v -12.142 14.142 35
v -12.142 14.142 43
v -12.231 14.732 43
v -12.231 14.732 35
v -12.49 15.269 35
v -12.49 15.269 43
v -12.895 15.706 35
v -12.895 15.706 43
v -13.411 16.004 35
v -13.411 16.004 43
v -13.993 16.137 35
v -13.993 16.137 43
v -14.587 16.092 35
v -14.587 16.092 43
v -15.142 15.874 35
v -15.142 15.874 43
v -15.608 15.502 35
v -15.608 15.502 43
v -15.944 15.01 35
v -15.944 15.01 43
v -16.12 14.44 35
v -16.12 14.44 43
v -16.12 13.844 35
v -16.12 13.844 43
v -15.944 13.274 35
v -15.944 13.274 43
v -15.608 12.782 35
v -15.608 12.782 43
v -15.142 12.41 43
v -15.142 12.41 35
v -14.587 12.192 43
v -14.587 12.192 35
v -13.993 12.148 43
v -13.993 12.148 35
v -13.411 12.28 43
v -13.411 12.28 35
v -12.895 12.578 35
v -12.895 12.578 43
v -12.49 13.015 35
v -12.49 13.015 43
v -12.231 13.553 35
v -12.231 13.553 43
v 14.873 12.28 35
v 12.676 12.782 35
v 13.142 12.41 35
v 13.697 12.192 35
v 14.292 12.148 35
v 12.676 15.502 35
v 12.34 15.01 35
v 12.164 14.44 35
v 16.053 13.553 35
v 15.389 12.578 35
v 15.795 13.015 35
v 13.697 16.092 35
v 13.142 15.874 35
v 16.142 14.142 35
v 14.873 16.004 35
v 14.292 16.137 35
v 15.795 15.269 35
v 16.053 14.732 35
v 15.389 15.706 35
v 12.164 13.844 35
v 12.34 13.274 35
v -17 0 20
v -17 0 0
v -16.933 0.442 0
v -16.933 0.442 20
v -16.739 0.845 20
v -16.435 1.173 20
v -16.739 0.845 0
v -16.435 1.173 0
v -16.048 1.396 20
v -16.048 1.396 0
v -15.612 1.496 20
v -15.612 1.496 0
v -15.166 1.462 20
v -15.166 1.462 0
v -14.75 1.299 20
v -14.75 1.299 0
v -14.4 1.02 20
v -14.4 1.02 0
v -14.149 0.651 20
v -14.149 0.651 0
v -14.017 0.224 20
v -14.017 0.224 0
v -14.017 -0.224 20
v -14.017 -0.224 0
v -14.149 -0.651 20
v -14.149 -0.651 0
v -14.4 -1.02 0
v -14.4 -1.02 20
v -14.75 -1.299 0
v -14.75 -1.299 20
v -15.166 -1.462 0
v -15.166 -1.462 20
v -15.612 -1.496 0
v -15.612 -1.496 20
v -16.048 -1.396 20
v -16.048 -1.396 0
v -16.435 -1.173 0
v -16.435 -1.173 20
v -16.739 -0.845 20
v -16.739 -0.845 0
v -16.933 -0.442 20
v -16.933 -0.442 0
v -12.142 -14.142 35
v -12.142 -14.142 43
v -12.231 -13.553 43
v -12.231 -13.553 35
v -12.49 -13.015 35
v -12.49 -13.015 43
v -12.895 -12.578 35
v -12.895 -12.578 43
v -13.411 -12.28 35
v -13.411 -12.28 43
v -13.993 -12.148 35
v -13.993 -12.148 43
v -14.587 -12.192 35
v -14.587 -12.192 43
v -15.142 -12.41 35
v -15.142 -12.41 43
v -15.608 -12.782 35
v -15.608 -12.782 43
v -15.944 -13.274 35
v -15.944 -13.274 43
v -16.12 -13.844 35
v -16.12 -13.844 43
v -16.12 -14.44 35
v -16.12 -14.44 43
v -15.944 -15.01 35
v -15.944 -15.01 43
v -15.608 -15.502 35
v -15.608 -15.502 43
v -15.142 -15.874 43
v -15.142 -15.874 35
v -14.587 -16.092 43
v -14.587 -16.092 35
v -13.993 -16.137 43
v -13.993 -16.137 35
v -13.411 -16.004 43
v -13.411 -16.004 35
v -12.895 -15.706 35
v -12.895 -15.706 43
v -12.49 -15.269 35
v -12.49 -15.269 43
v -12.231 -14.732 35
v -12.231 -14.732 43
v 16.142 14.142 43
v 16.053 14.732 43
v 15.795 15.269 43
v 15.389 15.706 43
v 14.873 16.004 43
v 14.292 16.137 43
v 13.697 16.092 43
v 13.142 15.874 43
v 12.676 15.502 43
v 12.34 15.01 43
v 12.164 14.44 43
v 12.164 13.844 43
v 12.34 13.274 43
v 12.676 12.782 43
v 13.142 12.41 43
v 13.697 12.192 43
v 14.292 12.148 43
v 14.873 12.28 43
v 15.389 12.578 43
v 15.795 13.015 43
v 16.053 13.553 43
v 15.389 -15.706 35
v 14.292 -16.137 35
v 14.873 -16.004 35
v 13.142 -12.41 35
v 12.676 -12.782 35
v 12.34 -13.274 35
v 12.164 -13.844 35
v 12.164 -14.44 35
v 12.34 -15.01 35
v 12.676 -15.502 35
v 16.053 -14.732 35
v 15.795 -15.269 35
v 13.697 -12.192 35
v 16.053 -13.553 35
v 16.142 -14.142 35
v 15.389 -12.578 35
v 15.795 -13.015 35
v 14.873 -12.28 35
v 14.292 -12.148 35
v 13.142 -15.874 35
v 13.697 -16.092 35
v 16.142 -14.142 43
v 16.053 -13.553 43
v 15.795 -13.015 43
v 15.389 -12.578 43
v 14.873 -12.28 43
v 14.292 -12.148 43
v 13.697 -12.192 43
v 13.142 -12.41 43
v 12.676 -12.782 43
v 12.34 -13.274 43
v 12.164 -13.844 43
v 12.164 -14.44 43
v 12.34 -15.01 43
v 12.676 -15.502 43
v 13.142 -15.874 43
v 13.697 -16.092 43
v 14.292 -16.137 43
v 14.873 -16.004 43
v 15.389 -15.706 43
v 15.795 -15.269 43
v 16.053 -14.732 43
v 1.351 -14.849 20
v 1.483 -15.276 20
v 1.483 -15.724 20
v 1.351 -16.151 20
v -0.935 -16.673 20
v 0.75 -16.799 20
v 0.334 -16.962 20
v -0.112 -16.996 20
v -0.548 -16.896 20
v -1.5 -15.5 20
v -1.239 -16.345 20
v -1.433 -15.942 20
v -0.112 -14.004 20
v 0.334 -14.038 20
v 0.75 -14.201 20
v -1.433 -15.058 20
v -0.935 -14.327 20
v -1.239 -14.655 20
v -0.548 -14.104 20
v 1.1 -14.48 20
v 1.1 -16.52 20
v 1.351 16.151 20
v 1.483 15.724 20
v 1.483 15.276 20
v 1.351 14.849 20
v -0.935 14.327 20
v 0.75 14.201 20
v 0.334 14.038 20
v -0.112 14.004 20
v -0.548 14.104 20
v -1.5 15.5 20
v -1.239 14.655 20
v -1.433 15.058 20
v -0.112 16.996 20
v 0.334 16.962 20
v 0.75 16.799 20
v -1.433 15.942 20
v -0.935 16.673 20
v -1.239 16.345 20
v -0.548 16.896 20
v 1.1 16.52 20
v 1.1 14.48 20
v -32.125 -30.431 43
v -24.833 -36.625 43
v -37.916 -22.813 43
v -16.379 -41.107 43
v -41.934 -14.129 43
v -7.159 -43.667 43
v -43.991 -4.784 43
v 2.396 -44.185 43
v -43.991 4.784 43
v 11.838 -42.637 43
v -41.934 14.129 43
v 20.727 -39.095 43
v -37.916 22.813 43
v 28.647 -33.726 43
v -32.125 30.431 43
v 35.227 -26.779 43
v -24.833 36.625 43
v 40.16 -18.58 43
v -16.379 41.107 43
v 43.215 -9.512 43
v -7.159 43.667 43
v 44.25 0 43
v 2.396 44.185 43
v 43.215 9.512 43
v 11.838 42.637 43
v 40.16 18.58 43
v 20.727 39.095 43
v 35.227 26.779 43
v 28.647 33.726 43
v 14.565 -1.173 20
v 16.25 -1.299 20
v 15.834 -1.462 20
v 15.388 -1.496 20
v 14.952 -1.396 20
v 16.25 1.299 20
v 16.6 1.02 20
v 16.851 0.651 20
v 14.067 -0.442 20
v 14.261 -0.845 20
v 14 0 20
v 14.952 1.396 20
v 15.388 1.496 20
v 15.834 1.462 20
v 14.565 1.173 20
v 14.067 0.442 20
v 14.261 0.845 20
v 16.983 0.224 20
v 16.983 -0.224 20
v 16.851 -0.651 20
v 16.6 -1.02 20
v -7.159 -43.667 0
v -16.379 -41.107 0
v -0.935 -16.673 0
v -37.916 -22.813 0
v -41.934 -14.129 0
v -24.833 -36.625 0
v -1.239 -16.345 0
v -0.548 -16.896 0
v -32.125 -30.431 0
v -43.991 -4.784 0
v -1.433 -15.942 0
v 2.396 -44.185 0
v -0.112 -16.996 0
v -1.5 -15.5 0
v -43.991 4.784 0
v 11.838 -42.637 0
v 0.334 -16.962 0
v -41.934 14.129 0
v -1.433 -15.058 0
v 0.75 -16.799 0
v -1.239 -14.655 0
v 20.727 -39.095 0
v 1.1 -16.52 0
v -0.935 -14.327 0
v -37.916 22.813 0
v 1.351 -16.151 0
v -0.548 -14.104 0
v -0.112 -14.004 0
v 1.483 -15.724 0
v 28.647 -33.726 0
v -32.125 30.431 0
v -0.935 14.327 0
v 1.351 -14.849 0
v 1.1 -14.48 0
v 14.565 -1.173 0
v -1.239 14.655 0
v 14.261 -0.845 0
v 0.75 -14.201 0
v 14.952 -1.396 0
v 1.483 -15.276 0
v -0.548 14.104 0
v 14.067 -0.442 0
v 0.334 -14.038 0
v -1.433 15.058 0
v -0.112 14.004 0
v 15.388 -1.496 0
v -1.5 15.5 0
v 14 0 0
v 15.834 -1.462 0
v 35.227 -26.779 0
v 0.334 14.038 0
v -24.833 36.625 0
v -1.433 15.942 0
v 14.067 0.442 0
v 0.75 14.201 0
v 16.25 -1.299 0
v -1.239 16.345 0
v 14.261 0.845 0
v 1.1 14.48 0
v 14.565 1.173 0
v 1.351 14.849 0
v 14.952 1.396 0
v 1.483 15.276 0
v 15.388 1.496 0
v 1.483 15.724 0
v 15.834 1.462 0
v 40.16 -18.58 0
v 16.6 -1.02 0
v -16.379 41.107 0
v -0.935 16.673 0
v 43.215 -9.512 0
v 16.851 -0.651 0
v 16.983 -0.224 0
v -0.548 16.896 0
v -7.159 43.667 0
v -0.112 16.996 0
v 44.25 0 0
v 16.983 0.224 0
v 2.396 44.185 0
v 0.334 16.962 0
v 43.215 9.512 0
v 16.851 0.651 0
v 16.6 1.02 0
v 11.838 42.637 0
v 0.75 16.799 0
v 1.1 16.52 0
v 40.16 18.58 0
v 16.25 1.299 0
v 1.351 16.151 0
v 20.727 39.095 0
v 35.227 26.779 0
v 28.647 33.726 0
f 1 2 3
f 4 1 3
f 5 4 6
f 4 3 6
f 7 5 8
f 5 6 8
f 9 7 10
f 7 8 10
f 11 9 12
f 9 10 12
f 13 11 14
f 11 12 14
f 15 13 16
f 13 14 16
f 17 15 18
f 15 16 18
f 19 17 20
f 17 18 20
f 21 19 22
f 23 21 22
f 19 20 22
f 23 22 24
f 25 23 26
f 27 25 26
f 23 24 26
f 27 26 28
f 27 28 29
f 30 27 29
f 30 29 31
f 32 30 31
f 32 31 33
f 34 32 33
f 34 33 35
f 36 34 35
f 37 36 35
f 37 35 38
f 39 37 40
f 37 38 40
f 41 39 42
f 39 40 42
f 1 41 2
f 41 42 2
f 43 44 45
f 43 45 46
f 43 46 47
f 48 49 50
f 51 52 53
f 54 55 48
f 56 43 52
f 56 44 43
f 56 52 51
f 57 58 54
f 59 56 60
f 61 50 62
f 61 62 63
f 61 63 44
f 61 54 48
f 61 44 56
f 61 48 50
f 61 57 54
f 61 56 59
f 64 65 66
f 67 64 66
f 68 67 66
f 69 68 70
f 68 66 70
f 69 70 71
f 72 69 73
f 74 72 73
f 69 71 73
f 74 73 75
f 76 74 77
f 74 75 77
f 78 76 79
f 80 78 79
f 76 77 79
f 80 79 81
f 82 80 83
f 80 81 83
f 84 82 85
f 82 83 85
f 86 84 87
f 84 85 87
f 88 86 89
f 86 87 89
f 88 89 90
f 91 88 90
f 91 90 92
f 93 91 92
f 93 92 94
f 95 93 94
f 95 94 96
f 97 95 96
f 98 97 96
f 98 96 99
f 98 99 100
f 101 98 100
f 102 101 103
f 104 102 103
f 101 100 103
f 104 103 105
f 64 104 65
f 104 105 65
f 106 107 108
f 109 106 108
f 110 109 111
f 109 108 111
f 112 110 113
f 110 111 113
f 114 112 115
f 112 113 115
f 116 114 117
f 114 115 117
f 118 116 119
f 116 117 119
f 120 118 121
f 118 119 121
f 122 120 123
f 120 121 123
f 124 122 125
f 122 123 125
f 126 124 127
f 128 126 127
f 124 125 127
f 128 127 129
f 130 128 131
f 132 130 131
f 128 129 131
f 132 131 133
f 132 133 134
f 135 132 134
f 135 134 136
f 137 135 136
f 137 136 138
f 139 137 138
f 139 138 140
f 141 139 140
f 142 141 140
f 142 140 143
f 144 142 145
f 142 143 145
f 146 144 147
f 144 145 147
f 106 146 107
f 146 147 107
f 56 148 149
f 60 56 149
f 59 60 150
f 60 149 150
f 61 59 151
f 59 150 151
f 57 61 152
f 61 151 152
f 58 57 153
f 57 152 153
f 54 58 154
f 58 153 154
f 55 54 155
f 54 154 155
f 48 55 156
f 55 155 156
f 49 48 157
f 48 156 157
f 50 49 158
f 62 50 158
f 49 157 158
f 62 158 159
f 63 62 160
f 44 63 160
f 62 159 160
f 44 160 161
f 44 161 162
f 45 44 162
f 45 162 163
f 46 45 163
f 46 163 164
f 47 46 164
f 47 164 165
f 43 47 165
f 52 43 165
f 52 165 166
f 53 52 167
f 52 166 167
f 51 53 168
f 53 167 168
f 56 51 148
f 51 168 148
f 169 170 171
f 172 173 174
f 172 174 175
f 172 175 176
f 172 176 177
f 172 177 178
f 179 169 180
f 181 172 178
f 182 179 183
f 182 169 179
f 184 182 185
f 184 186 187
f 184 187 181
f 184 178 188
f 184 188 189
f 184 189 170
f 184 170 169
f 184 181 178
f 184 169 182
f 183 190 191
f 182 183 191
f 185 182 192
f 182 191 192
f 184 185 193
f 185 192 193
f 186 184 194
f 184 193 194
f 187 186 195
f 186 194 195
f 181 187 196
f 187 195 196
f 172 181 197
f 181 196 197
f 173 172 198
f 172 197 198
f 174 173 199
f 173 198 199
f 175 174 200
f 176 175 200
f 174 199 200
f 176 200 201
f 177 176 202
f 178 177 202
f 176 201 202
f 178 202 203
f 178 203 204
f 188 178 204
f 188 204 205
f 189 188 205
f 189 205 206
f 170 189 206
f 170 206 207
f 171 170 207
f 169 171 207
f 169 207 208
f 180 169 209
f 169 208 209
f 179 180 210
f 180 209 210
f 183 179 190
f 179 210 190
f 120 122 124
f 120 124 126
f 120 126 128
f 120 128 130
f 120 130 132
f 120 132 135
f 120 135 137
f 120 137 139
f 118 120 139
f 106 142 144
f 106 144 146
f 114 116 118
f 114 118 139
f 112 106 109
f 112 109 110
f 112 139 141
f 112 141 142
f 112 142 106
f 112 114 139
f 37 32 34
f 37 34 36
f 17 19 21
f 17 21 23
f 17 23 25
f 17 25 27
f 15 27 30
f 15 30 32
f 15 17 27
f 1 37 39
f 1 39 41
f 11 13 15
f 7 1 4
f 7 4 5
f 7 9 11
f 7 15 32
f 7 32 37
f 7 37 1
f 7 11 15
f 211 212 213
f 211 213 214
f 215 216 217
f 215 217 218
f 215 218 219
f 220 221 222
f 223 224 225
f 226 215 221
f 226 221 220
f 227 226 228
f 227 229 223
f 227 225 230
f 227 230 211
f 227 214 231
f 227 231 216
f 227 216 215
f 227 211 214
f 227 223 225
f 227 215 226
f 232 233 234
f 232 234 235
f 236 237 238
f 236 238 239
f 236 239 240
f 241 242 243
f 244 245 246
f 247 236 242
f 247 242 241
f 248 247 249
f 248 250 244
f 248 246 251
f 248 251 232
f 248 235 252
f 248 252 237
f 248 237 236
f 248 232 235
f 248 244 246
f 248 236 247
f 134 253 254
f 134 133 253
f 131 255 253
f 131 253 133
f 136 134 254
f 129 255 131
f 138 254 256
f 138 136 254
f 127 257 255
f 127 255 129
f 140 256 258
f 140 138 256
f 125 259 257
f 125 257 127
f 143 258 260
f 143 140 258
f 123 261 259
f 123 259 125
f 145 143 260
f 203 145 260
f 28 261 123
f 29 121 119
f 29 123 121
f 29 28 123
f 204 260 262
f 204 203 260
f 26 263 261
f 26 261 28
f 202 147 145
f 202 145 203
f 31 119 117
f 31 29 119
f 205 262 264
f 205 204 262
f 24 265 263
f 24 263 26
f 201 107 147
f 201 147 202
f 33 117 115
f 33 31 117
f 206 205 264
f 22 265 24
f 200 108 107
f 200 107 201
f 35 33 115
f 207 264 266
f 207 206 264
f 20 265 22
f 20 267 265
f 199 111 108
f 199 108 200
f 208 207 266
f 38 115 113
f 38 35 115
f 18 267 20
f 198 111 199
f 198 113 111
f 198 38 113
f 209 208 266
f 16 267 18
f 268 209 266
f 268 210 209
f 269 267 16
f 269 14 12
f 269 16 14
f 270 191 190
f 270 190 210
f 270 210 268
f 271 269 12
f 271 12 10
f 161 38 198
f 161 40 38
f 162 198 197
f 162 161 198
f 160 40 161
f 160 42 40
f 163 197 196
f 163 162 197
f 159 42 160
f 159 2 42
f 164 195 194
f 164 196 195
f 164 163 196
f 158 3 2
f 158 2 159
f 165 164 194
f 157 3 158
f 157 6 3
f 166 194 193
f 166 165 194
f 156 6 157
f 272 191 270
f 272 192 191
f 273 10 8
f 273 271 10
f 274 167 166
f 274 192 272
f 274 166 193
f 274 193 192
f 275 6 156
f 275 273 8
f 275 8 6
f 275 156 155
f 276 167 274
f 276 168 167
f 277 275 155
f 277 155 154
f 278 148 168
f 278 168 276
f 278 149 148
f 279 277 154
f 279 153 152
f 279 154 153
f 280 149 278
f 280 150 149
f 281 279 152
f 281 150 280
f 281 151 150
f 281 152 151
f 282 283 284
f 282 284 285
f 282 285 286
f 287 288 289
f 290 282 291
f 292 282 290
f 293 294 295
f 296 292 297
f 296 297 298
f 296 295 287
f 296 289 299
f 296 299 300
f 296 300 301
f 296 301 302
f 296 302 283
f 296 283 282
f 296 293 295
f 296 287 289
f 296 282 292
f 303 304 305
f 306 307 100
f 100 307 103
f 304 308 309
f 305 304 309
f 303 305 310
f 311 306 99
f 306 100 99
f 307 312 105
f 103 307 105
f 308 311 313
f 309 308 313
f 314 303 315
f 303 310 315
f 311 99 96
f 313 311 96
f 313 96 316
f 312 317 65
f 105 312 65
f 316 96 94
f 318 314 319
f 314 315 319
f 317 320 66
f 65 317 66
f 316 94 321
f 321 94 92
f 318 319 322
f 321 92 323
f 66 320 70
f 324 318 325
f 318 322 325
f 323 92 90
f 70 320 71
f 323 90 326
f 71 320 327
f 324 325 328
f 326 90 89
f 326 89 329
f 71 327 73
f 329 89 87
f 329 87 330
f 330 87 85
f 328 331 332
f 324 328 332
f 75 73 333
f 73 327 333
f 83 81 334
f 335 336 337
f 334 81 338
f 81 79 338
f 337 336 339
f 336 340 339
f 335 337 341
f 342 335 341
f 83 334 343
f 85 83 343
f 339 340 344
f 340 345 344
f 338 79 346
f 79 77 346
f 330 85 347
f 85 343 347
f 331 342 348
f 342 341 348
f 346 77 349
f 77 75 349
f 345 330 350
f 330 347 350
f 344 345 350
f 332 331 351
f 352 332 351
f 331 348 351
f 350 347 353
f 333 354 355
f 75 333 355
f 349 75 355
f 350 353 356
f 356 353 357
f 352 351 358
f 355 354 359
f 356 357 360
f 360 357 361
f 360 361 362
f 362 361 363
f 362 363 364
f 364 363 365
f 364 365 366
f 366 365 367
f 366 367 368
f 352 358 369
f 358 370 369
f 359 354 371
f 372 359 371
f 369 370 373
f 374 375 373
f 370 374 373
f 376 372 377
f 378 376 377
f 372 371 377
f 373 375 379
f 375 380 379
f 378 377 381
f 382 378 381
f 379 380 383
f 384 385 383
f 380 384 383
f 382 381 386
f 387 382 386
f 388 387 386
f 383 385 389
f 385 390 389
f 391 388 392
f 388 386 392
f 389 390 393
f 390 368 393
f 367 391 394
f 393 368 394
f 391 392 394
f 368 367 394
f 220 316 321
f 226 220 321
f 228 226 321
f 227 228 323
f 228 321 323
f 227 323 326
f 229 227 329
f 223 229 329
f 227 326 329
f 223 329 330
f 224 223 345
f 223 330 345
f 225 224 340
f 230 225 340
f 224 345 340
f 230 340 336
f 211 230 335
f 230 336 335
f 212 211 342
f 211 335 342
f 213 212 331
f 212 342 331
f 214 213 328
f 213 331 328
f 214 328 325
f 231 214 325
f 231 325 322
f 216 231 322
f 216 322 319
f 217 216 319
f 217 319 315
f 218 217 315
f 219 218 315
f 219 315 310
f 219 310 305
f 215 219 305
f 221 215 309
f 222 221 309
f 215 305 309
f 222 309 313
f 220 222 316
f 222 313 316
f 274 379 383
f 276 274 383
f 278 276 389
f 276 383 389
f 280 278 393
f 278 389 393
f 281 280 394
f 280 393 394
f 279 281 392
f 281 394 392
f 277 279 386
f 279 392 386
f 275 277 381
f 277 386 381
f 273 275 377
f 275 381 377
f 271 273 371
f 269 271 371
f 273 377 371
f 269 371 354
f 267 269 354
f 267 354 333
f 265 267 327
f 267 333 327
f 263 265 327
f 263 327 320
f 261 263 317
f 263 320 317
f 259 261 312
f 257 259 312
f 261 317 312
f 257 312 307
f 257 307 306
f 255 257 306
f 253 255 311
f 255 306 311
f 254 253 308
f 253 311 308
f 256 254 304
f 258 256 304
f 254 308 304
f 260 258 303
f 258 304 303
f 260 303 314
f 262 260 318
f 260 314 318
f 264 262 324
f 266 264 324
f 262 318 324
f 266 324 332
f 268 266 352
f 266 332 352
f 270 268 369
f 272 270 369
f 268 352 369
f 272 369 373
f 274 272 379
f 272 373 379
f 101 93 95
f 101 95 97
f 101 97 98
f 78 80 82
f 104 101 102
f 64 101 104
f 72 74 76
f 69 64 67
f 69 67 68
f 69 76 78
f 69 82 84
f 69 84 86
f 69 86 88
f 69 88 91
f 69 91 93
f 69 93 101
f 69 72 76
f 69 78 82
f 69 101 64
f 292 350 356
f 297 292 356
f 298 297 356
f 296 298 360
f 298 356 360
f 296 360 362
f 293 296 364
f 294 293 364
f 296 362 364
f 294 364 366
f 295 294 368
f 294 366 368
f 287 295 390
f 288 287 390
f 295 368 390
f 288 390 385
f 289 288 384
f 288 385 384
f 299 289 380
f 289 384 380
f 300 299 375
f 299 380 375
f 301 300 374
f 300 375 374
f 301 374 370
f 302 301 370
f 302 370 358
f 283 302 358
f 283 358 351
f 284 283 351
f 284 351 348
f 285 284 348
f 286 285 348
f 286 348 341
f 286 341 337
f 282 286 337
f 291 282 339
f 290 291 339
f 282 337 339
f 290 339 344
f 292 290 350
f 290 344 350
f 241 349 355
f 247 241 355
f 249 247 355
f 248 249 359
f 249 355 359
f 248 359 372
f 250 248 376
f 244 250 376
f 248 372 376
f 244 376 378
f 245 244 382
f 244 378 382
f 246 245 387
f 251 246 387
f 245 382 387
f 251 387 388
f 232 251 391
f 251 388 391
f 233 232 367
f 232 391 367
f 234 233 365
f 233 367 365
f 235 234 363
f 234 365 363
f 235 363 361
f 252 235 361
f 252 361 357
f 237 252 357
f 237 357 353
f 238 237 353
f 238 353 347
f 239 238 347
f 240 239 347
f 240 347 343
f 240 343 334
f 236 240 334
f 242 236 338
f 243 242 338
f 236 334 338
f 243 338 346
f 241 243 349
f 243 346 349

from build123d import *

# Parameters (mm, degrees)
SKETCH_1_R          = 44.25
EXTRUDE_1_DEPTH     = 43
SKETCH_2_R          = 2
CUT_EXTRUDE_1_DEPTH = 8
SKETCH_3_R          = 1.5
CUT_EXTRUDE_2_DEPTH = 20


with BuildPart() as part:
    # 草图1 → 凸台-拉伸1 (new body)
    with BuildSketch(Plane.XY):
        Circle(SKETCH_1_R)
    extrude(amount=EXTRUDE_1_DEPTH)

    # 草图2 → 切除-拉伸1 (cut)
    with BuildSketch(Plane.XY.offset(43)):
        with Locations((-14.142135624, 14.142135624)):
            Circle(SKETCH_2_R)
        with Locations((14.142135624, 14.142135624)):
            Circle(SKETCH_2_R)
        with Locations((-14.142135624, -14.142135624)):
            Circle(SKETCH_2_R)
        with Locations((14.142135624, -14.142135624)):
            Circle(SKETCH_2_R)
    extrude(amount=-CUT_EXTRUDE_1_DEPTH, mode=Mode.SUBTRACT)

    # 草图3 → 切除-拉伸2 (cut)
    with BuildSketch(Plane(origin=(0, 0, 0), x_dir=(-1, 0, 0), z_dir=(0, 0, -1))):
        with Locations((0, 15.5)):
            Circle(SKETCH_3_R)
        with Locations((15.5, 0)):
            Circle(SKETCH_3_R)
        with Locations((-15.5, 0)):
            Circle(SKETCH_3_R)
        with Locations((0, -15.5)):
            Circle(SKETCH_3_R)
    extrude(amount=-CUT_EXTRUDE_2_DEPTH, mode=Mode.SUBTRACT)


solid = part.part
